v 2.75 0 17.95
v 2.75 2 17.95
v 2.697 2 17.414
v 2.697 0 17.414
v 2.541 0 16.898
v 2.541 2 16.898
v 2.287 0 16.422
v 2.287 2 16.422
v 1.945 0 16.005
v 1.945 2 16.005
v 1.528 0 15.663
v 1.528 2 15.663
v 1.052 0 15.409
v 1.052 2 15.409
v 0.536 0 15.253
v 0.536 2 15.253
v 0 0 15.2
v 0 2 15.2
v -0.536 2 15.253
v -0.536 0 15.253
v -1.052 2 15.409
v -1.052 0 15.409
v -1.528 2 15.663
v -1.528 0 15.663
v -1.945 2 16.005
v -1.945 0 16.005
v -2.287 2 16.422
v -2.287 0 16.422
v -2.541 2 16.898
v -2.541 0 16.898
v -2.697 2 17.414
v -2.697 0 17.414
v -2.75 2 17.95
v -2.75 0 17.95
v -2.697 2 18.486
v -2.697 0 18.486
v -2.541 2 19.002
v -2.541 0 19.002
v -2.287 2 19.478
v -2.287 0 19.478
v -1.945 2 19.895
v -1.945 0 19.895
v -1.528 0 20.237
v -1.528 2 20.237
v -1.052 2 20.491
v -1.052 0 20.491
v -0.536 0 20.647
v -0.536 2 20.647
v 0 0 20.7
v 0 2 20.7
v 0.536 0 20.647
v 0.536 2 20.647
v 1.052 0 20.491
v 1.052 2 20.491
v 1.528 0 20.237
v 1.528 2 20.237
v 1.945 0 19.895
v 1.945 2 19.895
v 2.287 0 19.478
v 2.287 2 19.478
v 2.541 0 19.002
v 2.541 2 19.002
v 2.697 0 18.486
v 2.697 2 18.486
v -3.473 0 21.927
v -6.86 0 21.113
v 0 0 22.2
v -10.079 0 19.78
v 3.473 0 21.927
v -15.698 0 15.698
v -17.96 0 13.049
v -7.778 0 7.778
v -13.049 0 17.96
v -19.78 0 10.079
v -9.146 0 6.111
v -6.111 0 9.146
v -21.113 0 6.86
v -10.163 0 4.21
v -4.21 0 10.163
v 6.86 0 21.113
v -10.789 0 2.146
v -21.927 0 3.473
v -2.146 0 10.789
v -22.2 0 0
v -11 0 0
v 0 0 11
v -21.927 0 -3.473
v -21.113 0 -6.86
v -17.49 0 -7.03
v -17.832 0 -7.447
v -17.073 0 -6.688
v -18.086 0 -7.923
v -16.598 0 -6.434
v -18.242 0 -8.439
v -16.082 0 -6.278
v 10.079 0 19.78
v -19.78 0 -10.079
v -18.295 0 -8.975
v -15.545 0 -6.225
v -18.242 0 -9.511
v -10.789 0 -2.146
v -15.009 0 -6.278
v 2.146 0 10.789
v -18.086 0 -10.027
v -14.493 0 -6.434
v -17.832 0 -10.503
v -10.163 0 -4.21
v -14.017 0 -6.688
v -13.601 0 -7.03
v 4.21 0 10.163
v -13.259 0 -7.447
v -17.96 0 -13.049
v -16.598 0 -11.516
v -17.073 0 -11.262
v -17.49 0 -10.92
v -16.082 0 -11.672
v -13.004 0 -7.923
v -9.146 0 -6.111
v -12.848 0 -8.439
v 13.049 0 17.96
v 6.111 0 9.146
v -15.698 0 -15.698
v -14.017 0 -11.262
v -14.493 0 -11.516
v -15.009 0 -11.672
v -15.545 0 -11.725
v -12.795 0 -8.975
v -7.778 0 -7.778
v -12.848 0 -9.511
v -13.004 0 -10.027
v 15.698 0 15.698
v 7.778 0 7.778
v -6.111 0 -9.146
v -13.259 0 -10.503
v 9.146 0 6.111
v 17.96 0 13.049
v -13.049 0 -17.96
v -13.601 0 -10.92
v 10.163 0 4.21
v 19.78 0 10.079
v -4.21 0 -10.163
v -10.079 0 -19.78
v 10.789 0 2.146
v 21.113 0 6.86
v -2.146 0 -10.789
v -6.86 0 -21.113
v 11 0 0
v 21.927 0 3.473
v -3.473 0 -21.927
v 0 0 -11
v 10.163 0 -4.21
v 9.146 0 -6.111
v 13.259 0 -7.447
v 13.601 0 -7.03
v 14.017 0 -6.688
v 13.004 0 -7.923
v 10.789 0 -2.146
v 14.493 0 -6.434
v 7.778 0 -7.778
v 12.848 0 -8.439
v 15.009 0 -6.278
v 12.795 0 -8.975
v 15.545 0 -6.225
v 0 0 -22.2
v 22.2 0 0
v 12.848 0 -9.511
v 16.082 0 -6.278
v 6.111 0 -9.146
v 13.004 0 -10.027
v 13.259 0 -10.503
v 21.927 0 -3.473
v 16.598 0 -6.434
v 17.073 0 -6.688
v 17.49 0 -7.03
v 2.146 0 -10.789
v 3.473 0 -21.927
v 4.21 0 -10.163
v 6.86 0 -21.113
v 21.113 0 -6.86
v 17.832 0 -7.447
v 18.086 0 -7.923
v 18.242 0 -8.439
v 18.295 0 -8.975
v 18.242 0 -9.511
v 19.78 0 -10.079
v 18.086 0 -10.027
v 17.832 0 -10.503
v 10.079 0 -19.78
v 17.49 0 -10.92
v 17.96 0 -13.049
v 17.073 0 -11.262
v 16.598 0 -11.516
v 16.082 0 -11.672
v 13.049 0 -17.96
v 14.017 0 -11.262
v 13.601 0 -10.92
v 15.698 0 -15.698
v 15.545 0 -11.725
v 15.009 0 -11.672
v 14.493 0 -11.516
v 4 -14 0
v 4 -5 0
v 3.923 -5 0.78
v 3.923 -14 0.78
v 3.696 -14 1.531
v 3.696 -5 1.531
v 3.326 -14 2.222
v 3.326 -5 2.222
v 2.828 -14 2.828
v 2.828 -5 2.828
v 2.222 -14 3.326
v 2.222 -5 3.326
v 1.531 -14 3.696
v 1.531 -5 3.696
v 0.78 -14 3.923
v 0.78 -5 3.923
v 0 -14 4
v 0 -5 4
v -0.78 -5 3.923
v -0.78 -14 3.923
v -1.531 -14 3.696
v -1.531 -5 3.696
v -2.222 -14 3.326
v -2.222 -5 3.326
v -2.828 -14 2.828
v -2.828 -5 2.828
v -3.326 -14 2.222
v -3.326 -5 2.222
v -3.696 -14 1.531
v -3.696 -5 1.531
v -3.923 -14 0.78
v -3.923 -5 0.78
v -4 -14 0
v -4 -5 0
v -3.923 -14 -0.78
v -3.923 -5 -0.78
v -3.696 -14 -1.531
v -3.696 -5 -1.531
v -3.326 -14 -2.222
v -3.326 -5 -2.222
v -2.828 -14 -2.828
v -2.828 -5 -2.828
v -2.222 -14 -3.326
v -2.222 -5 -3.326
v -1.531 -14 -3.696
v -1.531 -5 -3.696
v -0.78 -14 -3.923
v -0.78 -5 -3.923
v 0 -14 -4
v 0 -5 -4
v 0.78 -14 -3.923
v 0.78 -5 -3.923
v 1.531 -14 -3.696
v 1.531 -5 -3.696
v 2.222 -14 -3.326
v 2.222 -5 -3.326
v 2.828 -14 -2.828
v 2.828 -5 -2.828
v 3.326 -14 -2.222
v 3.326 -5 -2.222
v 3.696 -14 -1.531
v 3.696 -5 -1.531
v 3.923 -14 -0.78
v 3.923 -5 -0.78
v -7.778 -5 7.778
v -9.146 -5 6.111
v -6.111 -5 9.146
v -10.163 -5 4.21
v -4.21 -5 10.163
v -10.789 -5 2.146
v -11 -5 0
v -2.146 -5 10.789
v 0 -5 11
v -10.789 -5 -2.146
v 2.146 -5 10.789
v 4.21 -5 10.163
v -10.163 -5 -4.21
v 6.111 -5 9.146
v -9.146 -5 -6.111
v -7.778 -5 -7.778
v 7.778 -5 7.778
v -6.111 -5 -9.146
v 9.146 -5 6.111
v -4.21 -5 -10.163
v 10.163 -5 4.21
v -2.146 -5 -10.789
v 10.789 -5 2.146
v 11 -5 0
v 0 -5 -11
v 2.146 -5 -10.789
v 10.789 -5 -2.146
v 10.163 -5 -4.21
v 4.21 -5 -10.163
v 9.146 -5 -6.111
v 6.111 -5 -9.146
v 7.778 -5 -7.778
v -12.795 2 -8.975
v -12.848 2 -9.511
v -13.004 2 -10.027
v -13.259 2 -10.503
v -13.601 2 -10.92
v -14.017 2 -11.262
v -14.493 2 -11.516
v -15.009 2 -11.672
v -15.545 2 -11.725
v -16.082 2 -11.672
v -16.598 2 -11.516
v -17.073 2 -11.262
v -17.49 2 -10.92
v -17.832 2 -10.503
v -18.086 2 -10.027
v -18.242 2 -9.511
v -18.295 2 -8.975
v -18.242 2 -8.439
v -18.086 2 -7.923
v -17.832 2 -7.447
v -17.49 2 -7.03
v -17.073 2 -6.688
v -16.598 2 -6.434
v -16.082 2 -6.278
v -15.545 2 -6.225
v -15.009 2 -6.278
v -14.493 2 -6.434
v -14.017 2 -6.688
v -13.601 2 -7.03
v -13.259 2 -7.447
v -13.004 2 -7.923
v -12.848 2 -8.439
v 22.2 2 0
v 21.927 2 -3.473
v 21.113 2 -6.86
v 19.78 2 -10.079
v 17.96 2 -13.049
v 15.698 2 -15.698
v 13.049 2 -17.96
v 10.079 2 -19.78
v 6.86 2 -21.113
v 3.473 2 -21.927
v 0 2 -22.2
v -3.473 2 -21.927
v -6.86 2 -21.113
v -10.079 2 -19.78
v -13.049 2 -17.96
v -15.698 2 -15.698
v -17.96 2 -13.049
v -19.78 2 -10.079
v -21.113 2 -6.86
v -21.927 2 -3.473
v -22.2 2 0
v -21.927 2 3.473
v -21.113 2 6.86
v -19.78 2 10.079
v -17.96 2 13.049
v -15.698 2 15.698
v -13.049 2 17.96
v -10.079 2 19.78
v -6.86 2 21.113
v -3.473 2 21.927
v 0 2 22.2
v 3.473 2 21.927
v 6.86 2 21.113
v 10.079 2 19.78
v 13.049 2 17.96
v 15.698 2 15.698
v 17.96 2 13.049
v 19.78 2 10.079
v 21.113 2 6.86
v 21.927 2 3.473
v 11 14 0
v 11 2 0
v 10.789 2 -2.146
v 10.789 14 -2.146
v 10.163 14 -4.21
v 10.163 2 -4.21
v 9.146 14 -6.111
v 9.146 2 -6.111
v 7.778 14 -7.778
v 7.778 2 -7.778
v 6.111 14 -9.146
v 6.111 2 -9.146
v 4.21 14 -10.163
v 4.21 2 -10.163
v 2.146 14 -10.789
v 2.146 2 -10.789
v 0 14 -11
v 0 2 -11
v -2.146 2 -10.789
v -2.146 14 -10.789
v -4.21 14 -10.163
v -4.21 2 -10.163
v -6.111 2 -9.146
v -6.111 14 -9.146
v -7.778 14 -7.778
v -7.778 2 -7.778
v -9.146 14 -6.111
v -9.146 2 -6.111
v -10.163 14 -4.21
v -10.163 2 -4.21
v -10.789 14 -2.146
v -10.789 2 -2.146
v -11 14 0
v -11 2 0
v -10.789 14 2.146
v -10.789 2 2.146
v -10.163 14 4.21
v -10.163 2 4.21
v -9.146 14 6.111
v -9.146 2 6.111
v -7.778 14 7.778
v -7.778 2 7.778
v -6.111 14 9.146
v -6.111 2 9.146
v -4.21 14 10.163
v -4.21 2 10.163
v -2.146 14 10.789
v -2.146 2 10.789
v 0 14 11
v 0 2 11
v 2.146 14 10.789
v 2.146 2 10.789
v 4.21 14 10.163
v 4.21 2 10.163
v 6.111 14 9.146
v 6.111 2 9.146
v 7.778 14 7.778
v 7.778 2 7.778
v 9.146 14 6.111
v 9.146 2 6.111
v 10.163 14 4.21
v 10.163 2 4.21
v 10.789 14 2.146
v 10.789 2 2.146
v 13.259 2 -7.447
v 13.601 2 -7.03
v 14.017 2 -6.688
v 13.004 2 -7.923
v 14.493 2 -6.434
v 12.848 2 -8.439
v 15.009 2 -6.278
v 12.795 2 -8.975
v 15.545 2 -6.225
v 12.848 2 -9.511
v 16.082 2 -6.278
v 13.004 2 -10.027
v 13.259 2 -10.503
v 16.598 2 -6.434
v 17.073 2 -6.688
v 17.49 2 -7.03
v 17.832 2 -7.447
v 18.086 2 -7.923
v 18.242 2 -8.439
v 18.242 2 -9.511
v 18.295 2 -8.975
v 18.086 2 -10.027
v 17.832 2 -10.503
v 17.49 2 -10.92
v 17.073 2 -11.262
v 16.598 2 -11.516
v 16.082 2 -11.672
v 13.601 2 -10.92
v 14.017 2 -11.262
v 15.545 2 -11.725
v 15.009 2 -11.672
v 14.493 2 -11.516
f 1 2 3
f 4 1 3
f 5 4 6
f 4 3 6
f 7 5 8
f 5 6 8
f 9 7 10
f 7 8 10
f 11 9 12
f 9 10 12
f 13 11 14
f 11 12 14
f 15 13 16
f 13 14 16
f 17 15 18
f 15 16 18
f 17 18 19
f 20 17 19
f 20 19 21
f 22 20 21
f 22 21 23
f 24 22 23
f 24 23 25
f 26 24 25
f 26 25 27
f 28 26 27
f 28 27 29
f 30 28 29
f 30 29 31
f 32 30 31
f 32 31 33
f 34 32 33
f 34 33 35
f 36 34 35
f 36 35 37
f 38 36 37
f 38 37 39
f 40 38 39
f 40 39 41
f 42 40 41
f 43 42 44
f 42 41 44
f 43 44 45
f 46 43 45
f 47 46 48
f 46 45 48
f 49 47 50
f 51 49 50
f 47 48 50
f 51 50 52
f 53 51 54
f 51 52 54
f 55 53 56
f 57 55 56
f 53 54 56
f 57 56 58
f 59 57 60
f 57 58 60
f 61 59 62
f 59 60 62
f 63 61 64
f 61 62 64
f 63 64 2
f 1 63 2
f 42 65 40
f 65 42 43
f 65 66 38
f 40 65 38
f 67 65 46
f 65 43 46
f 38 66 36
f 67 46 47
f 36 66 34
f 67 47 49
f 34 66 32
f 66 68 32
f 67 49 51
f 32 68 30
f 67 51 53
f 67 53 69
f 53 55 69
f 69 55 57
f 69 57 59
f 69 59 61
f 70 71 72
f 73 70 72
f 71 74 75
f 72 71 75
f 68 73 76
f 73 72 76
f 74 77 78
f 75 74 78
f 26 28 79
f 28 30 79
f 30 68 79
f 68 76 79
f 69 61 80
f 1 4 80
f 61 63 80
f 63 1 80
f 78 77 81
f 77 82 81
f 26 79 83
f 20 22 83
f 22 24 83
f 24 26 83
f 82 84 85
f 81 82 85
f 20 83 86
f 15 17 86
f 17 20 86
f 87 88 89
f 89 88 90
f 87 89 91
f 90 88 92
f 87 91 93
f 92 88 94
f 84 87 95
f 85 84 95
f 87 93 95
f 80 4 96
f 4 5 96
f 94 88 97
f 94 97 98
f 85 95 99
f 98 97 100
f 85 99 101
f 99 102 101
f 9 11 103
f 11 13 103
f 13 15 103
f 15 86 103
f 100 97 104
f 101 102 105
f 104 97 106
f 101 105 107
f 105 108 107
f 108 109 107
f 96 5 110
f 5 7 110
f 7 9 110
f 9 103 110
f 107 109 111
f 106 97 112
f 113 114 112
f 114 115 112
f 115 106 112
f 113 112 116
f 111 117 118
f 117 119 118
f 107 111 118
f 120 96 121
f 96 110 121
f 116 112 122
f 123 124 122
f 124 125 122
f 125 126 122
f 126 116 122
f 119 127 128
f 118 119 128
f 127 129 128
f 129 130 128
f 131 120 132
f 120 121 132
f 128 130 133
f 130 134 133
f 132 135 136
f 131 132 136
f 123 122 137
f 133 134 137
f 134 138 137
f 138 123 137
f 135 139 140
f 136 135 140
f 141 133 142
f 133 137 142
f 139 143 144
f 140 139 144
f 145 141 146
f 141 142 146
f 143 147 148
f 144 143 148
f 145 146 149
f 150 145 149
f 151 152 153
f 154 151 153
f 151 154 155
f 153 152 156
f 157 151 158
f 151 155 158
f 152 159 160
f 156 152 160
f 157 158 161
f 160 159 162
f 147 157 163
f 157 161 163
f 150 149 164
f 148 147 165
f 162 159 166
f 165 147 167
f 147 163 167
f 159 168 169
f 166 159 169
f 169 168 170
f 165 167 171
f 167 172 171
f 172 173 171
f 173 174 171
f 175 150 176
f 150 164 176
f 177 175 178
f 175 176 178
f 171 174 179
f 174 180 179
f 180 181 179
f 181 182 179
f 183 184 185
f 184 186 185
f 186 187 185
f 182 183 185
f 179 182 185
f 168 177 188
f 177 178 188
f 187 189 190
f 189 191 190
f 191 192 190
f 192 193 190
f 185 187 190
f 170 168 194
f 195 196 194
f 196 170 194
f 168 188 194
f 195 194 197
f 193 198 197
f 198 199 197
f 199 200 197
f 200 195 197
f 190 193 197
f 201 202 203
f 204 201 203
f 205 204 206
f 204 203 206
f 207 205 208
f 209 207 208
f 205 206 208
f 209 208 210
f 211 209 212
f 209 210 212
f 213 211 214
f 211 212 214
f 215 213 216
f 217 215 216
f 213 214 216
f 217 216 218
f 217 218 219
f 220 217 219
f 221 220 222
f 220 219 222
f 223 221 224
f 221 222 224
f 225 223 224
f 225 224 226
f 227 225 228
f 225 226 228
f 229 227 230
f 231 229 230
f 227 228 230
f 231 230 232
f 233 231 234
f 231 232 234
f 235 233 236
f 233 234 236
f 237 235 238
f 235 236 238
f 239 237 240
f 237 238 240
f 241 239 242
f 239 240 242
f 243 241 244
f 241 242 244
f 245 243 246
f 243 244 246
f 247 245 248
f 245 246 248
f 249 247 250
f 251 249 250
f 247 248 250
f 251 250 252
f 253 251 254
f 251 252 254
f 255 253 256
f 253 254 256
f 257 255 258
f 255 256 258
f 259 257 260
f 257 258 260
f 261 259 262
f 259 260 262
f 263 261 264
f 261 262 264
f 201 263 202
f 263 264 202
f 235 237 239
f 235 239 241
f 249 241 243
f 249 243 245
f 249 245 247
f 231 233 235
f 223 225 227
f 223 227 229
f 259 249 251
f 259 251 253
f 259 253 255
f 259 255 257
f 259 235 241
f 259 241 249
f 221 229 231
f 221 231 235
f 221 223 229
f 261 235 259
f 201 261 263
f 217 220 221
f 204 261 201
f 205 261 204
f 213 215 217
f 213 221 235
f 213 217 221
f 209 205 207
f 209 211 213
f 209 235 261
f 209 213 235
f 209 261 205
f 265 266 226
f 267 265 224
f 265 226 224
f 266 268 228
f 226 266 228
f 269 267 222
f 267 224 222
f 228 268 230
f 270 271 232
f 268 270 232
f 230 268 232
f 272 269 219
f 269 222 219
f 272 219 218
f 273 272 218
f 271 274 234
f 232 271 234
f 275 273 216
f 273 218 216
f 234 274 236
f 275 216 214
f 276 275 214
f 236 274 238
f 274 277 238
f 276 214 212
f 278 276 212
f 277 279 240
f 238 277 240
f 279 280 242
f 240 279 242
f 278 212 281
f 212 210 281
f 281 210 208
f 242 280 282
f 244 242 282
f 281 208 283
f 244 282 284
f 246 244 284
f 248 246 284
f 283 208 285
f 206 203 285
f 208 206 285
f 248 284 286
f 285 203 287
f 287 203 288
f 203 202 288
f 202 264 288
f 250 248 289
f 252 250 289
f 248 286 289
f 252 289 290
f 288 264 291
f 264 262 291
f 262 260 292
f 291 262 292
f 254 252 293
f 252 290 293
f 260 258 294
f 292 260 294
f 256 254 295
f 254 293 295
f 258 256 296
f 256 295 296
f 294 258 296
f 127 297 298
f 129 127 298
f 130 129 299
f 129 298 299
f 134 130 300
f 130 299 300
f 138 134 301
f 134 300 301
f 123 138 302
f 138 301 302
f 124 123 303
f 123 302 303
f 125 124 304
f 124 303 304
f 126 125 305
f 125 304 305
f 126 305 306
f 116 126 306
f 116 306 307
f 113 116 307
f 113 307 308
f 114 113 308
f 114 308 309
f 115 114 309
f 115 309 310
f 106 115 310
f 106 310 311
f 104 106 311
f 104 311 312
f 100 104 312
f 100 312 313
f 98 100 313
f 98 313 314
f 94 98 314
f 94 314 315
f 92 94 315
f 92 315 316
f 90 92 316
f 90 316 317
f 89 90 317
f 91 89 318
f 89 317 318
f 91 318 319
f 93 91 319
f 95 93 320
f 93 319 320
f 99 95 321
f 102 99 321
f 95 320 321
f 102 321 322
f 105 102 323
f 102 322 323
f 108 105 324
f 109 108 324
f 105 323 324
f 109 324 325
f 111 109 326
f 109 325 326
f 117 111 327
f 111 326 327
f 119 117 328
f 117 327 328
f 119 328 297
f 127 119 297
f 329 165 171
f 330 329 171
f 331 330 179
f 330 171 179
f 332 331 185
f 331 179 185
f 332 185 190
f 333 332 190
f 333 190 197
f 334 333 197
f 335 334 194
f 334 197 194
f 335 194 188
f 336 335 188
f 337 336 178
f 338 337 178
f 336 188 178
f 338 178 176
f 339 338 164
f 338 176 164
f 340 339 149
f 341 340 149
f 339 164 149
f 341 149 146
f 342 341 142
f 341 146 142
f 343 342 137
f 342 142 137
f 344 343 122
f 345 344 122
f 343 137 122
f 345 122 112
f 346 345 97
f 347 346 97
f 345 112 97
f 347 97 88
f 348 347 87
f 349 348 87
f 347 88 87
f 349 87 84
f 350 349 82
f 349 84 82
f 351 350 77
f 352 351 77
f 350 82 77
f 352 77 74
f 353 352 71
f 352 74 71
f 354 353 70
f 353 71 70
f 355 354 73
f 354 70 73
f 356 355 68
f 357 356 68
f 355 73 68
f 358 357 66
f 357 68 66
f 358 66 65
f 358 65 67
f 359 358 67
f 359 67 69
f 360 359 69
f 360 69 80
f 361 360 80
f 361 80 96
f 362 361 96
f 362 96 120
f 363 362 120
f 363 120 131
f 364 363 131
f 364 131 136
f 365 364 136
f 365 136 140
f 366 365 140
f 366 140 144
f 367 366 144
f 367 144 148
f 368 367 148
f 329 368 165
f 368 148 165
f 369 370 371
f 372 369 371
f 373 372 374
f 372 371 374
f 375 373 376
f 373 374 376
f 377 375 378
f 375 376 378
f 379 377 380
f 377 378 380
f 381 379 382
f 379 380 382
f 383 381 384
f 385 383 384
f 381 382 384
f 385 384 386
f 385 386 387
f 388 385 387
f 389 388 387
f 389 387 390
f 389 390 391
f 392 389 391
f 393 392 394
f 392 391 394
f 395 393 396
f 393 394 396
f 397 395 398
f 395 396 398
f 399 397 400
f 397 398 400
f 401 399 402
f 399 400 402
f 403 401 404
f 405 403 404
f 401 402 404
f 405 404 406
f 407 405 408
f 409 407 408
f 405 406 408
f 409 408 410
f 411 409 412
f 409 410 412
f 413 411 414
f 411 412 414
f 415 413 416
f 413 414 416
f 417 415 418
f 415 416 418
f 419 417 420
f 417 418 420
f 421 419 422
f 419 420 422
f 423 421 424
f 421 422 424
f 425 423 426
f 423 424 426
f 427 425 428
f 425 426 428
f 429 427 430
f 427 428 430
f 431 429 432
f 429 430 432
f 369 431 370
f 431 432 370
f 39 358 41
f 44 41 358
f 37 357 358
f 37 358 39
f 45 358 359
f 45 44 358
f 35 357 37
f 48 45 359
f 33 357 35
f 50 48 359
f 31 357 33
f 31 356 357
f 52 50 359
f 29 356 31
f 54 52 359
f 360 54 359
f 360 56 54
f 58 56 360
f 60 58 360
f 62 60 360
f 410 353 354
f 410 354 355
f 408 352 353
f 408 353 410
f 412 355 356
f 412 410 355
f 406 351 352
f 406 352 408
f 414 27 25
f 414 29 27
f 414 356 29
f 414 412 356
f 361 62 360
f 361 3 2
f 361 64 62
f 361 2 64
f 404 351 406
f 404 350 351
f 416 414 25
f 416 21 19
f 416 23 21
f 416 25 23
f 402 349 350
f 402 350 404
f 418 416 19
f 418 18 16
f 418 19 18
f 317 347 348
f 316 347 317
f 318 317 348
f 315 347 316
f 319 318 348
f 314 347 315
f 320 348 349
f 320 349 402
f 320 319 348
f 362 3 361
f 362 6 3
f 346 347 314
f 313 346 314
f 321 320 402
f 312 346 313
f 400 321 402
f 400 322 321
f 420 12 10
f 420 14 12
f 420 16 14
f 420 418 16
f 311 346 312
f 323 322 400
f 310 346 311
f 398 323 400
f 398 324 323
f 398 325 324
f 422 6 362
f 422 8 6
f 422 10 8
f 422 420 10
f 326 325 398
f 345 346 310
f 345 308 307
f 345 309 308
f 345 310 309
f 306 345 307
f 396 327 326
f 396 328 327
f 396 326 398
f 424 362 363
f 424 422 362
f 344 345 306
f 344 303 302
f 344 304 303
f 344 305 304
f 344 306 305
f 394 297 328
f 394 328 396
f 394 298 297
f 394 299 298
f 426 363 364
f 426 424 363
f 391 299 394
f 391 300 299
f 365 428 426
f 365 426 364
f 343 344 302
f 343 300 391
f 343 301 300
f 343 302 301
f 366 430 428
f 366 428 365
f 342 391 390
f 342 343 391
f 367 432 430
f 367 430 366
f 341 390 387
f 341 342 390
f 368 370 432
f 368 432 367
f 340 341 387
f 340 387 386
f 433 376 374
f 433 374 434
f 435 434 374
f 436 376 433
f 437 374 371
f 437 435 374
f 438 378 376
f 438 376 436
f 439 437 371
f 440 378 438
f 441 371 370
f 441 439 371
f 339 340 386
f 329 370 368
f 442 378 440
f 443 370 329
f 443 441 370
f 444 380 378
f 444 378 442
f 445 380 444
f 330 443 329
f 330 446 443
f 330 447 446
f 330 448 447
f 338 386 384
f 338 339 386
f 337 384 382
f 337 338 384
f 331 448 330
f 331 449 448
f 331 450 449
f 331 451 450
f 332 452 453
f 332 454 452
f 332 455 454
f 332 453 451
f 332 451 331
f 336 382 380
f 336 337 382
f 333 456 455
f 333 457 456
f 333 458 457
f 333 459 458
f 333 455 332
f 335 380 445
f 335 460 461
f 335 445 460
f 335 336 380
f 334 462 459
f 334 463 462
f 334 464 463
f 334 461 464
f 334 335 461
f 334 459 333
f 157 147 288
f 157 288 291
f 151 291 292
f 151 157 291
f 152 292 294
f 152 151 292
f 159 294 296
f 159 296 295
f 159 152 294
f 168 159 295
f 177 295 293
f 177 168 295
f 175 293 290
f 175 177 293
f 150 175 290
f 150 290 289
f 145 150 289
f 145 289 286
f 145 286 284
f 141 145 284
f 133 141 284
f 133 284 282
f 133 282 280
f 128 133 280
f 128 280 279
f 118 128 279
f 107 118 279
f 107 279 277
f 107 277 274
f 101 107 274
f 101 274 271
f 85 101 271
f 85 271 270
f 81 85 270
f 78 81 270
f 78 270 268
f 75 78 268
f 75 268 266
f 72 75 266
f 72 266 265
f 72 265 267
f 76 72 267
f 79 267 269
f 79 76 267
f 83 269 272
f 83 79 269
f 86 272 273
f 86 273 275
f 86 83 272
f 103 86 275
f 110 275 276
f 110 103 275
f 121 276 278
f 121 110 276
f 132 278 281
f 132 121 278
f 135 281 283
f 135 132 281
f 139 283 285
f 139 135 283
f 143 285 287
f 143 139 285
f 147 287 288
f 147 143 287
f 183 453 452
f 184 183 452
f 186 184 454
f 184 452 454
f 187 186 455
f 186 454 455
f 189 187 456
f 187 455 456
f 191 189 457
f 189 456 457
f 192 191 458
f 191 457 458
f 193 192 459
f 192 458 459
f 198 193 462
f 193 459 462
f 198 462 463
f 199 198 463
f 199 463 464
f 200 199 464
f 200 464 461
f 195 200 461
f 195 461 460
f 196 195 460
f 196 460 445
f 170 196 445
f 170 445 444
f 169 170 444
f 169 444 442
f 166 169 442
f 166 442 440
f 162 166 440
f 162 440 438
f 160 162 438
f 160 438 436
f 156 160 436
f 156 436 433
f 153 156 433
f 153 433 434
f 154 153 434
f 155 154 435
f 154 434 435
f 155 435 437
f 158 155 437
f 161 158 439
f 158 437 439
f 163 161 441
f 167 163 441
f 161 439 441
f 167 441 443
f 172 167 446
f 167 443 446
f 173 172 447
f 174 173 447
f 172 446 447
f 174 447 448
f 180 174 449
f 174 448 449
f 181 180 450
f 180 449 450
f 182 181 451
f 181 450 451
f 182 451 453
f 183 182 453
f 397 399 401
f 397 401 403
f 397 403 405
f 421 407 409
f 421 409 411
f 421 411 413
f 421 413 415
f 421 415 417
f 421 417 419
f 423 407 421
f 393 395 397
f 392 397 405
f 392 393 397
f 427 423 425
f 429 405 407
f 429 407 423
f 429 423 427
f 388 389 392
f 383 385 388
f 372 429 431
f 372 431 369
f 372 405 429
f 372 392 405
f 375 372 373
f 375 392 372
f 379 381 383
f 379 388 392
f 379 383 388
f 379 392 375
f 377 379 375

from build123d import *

# Parameters (mm, degrees)
SKETCH1_R           = 22.2
BOSS_EXTRUDE1_DEPTH = 2
SKETCH2_R           = 11
BOSS_EXTRUDE2_DEPTH = 12
BOSS_EXTRUDE3_START = -7
SKETCH2_2_R         = 11
BOSS_EXTRUDE3_DEPTH = 7
SKETCH3_R           = 4
BOSS_EXTRUDE4_DEPTH = 9
SKETCH4_R           = 2.75
CUT_EXTRUDE1_DEPTH  = 3.1


with BuildPart() as part:
    # Sketch1 → Boss-Extrude1 (new body)
    with BuildSketch(Plane(origin=(0, 0, 0), x_dir=(1, 0, 0), z_dir=(0, 1, 0))):
        Circle(SKETCH1_R)
    extrude(amount=BOSS_EXTRUDE1_DEPTH)

    # Sketch2 → Boss-Extrude2 (add)
    with BuildSketch(Plane(origin=(0, 2, 0), x_dir=(1, 0, 0), z_dir=(0, 1, 0))):
        Circle(SKETCH2_R)
    extrude(amount=BOSS_EXTRUDE2_DEPTH)

    # Sketch2<2> → Boss-Extrude3 (add)
    with BuildSketch(Plane(origin=(0, 2, 0), x_dir=(1, 0, 0), z_dir=(0, 1, 0)).offset(BOSS_EXTRUDE3_START)):
        Circle(SKETCH2_2_R)
    extrude(amount=BOSS_EXTRUDE3_DEPTH)

    # Sketch3 → Boss-Extrude4 (add)
    with BuildSketch(Plane.XZ.offset(5)):
        Circle(SKETCH3_R)
    extrude(amount=BOSS_EXTRUDE4_DEPTH)

    # Sketch4 → Cut-Extrude1 (cut)
    with BuildSketch(Plane(origin=(0, 2, 0), x_dir=(1, 0, 0), z_dir=(0, 1, 0))):
        with Locations((0, -17.95)):
            Circle(SKETCH4_R)
        with Locations((-15.545155998, 8.975)):
            Circle(SKETCH4_R)
        with Locations((15.545155998, 8.975)):
            Circle(SKETCH4_R)
    extrude(amount=-CUT_EXTRUDE1_DEPTH, mode=Mode.SUBTRACT)


solid = part.part
